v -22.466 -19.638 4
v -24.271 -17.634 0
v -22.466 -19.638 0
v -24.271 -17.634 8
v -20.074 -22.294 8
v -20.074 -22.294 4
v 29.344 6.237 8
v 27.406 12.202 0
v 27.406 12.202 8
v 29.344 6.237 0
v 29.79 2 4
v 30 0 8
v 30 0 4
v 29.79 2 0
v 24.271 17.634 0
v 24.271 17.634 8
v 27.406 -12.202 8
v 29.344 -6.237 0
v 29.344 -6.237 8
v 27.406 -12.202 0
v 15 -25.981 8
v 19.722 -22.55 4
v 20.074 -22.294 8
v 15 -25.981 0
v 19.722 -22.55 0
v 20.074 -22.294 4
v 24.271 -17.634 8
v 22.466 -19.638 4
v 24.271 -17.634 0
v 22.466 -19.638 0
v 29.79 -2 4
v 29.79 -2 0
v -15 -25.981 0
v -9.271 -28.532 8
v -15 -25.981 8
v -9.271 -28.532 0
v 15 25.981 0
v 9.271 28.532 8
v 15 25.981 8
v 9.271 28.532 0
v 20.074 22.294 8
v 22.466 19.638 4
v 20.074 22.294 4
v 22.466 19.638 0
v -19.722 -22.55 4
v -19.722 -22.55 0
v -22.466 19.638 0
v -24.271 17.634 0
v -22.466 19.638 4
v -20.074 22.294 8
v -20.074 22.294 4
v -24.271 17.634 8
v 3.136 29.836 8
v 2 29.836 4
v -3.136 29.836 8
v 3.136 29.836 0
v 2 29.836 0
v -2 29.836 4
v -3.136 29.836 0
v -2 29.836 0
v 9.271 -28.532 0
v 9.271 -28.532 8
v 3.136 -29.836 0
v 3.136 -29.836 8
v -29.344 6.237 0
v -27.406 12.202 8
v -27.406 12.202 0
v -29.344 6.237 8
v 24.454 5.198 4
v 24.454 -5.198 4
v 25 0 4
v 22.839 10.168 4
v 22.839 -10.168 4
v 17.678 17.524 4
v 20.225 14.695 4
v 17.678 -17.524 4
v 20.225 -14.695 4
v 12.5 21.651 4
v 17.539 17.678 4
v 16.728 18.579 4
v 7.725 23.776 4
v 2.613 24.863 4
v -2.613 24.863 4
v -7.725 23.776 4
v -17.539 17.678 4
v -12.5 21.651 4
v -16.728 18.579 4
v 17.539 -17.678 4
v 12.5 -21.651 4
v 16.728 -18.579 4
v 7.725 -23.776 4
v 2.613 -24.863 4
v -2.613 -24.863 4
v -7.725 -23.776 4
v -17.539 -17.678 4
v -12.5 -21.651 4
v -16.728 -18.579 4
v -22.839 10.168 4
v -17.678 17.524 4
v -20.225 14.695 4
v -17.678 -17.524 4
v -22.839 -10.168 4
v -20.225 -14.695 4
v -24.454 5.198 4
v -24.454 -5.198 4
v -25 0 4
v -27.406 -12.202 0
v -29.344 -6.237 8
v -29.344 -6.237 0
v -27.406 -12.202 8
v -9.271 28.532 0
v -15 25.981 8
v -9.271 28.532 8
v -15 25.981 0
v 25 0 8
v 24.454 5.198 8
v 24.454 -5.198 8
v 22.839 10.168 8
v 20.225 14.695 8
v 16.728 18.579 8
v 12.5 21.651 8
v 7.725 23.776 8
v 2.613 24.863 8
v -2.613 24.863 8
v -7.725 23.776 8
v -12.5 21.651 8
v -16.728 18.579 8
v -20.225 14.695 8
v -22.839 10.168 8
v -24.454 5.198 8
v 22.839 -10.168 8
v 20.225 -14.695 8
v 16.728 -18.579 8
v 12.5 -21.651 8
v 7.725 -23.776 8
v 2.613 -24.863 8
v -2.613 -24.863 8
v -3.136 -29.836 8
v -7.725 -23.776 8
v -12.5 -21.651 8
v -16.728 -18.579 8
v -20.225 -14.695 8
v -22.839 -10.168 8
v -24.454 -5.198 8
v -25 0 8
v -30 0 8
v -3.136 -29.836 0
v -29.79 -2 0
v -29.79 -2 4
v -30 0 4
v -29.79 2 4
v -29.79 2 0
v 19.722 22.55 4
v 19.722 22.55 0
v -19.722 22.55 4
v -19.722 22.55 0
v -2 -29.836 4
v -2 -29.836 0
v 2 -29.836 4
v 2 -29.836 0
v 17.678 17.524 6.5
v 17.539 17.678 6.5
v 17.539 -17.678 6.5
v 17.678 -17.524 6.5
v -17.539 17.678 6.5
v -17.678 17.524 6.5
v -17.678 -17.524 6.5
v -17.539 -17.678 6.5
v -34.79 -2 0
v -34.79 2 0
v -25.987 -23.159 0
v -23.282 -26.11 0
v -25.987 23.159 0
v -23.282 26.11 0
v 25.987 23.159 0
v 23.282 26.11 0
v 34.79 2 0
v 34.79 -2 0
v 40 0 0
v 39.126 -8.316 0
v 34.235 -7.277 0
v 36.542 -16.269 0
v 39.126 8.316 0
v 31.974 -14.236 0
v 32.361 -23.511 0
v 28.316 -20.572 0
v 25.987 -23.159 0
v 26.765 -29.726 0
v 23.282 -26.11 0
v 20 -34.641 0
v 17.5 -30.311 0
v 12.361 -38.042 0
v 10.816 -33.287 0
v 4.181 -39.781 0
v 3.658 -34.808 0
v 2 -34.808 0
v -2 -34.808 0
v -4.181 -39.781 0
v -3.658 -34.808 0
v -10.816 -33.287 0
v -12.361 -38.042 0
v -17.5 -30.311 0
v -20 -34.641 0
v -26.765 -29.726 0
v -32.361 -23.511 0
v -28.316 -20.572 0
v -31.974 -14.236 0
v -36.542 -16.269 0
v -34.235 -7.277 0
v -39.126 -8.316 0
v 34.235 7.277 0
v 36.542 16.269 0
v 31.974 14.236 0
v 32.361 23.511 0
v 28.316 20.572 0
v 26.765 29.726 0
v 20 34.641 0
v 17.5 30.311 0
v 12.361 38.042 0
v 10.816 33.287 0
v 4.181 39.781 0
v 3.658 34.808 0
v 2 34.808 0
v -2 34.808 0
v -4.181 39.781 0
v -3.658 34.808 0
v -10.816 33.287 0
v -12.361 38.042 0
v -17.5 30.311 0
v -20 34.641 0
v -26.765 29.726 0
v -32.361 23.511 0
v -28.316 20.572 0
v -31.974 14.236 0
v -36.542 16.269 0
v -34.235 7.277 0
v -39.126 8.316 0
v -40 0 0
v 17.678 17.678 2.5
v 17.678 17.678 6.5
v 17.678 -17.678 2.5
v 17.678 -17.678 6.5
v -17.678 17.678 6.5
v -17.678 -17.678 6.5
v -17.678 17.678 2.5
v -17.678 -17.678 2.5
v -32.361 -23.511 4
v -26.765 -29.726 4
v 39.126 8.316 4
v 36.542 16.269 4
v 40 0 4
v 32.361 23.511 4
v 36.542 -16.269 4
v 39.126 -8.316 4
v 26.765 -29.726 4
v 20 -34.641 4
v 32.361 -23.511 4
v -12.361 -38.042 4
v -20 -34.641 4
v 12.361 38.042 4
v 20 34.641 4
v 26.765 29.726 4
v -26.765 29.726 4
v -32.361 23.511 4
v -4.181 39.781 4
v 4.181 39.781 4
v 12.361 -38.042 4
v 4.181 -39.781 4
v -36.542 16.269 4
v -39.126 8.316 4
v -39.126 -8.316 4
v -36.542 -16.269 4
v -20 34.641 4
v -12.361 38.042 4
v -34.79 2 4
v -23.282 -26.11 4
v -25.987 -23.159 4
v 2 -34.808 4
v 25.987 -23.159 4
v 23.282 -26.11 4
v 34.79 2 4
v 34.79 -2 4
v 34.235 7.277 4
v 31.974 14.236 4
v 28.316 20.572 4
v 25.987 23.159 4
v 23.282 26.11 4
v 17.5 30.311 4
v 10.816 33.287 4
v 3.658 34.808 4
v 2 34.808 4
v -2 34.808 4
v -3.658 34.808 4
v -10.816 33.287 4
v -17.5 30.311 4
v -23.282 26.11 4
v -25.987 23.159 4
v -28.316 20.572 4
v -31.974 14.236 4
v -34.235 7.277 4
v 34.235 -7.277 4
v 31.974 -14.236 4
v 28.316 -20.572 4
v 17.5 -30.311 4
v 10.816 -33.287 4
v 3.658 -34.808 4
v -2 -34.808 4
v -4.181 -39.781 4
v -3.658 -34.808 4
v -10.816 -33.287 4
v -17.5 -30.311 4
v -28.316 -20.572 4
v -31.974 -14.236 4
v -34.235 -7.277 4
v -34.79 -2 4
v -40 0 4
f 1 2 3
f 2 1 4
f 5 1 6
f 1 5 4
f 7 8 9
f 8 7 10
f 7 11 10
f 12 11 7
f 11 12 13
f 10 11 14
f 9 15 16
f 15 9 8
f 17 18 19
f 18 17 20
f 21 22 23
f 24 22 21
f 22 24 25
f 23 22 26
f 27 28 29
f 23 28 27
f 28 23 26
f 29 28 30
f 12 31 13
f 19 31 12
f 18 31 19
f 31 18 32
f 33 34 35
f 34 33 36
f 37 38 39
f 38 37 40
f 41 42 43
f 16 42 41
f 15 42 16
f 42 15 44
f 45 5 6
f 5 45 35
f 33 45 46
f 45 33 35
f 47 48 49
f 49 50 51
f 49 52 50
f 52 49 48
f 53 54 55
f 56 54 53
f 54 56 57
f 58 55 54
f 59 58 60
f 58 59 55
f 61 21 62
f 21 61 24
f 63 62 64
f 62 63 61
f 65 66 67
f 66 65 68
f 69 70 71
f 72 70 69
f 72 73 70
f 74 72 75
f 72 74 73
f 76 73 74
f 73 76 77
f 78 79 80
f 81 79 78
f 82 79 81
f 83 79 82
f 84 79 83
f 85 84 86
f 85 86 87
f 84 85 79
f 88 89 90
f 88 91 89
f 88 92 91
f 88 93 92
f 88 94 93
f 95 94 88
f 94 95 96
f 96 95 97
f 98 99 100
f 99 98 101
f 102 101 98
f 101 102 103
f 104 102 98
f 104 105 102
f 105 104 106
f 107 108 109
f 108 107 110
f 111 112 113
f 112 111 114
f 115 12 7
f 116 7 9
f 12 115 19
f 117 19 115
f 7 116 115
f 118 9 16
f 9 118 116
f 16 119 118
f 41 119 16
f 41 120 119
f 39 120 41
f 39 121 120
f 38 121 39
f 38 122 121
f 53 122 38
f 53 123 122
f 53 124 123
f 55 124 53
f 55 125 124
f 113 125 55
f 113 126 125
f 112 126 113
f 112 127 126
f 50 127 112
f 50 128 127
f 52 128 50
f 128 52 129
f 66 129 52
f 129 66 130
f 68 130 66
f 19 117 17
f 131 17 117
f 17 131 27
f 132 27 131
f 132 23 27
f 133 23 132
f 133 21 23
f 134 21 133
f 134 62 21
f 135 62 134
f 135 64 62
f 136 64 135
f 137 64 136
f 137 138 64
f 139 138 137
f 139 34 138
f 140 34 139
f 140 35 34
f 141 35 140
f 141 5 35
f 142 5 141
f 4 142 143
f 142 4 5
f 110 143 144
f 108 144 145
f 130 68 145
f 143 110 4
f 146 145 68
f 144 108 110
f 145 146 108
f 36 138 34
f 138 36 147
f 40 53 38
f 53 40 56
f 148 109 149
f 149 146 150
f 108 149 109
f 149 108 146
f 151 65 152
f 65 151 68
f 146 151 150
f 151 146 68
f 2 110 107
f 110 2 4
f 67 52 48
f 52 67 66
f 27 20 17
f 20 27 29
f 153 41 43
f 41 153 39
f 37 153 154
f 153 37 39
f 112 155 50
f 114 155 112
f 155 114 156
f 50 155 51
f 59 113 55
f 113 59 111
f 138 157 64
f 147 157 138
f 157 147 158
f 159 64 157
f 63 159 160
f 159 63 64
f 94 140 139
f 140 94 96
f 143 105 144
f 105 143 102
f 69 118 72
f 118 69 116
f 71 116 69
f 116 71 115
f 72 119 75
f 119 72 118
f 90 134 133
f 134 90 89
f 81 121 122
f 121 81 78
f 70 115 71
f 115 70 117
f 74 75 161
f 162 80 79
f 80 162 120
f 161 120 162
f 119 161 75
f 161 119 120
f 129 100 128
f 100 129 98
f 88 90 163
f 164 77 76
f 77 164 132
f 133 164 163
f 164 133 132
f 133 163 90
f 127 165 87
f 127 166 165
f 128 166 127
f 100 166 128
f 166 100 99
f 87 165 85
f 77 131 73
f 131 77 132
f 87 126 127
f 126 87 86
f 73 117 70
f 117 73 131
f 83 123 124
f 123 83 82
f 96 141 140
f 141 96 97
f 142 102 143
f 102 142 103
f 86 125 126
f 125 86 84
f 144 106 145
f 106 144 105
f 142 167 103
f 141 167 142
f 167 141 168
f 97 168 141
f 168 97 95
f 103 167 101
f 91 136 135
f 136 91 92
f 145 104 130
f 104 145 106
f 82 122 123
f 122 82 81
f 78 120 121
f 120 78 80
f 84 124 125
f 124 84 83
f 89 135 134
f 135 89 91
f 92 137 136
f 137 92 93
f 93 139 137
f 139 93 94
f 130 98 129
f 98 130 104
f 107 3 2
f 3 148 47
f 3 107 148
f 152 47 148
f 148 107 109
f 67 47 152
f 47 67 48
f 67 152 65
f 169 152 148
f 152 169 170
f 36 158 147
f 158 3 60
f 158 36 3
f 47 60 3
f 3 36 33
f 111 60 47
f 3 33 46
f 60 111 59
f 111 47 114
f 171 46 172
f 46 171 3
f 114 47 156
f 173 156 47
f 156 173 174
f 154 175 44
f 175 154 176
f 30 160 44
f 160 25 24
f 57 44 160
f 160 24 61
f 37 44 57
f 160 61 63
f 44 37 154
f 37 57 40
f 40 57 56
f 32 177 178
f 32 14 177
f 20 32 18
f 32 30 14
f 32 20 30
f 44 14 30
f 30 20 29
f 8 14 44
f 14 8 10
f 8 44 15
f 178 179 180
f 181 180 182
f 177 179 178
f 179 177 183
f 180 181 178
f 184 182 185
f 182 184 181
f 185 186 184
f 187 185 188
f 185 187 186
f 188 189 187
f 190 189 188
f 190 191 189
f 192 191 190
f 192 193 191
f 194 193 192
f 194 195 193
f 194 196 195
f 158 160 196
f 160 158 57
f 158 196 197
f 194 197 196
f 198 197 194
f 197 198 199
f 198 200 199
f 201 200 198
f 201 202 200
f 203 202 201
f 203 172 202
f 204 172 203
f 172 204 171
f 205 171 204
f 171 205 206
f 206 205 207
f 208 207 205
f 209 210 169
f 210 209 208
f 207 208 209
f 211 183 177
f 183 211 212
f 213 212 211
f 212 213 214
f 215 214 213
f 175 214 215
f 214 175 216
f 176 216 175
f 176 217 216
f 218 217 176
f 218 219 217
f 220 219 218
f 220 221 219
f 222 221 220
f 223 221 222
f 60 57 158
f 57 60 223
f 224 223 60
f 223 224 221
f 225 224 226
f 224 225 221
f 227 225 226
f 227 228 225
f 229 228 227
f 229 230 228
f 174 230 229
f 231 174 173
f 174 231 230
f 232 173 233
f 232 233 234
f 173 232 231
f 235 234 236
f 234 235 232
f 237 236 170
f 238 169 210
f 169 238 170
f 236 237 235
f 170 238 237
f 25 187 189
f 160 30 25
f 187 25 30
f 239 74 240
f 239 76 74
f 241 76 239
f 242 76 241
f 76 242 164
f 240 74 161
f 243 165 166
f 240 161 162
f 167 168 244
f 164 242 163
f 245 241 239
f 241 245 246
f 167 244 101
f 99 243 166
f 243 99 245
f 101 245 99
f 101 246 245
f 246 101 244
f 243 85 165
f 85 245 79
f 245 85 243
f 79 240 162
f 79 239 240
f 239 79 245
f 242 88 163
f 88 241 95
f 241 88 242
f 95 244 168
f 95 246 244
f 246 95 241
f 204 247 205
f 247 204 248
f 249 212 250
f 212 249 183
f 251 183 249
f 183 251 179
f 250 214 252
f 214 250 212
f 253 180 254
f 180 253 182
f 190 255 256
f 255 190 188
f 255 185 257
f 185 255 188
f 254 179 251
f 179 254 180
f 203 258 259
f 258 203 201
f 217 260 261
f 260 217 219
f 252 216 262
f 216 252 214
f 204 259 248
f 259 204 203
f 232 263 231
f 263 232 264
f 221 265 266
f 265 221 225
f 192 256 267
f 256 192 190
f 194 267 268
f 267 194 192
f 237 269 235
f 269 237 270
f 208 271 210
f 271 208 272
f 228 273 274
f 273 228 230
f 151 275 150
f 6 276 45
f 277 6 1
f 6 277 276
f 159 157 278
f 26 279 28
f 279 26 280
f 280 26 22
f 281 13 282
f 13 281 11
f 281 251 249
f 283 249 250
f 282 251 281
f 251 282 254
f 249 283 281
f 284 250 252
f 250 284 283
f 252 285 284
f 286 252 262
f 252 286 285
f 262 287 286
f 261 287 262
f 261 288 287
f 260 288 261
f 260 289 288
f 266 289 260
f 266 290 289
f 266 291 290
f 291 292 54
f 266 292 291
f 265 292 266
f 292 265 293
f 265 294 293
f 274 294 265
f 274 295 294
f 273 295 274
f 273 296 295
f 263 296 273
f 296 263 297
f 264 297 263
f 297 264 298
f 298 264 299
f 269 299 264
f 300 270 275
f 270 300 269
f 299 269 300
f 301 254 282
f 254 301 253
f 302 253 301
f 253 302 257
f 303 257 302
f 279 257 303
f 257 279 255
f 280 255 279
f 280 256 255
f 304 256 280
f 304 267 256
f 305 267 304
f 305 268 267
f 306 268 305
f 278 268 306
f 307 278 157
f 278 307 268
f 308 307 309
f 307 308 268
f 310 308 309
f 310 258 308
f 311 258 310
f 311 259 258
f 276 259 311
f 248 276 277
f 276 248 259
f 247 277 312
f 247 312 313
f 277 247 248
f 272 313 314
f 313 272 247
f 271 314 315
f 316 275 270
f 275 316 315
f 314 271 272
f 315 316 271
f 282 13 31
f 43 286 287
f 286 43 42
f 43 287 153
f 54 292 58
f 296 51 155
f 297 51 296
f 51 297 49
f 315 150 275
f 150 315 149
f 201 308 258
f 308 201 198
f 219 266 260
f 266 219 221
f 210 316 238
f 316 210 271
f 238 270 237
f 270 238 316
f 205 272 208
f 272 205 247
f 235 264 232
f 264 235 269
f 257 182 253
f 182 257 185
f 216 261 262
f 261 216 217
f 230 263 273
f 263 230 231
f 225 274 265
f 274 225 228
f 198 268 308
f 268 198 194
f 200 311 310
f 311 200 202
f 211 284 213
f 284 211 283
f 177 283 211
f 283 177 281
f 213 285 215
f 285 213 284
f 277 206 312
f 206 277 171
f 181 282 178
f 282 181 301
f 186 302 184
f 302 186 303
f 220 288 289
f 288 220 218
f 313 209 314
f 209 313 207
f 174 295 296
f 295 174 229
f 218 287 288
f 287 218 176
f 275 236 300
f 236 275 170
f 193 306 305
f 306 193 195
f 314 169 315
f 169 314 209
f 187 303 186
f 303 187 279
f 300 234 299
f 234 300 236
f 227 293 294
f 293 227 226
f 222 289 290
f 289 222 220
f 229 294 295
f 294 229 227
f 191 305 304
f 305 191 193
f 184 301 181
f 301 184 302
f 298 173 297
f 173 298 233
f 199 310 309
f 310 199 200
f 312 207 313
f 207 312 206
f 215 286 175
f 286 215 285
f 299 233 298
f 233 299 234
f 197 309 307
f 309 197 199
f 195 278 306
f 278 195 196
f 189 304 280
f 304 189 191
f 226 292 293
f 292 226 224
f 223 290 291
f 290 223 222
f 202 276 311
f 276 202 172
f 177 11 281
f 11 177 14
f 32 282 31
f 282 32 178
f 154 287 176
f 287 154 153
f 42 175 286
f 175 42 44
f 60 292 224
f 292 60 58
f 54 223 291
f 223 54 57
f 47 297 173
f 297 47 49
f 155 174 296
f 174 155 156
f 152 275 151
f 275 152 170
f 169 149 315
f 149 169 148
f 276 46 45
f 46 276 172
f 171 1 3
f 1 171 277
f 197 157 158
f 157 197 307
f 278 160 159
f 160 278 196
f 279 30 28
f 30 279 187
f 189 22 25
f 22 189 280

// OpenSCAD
// file: ../src/util.scad
//Данная функция корректно смещает slc_ear и sqr_ear 
//под нужный радиус окружности.
module radiused(radius,offset) {
    ystate = sqrt(radius*radius - offset*offset);
    translate([0,ystate,0]) children(0);
}

module linear_array(length, total) {
    for(x = [0:length/(total - 1):length])
        translate([x,0,0]) children(0);
}

module mirror_copy(vector) {
    union() {
        mirror(vector) children(0);
        children(0);
    }
}
// file: ../src/symbol.scad
//Данный модуль строит 3д символ компании (image/symbol.png) 
module symbol(x,y,z) {
    symbol_file = "../image/symbol.png";
    symbol_x = 100;
    symbol_y = 100;
    
    scale([1/symbol_x*x,1/symbol_y*y,1/100*z])
    translate([0,0,100])
    surface(file=symbol_file, invert=true,center=true);
}

//Демонстрационный код.
//symbol(40,40,10);
// file: ../src/rim.scad
module rim(externalRadius,internalRadius,height) {
    difference() {
        cylinder(r=externalRadius, h=height);
        cylinder(r=internalRadius, h=height+1);
    }
}

//Демонстрационный код.
//based_rim(30, 25, 8, 3);
// file: ../src/ear.scad
include <util.scad>

//Угловатое квадратное ухо.
//"w" - толщина уха
module sqr_ear(y,x,w,h) {
    translate([-y/2,0,0])
    difference() {
        cube([y,x,h]);
        translate([w,0,0]) cube([y-w*2,x-w,h]);
    }
}

//Ухо со сглаженными углами.
//"y" - должен быть больше чем "x".
//"w" - толщина уха
module slc_ear(y,x,w,h){
    rotate([0,0,90])
    translate([0,-y/2,0])
    linear_extrude(height=h)
    polygon([
    [0,0],
    [x/2,0],
    [x,x/2],
    [x,y-x/2],
    [x/2,y],
    [0,y],
    [0,y - w],
    [x/2 - w * sin(45/2),y - w],
    [x - w * sin(45/2*3),y -x/2 - w * cos(45/2*3)],
    [x - w * sin(45/2*3),x/2 + w * cos(45/2*3)],
    [x/2 - w * sin(45/2),w],
    [0,w],
    ]);       
}

//Ухо в виде ободка.
module rim_ears(er,ir,iir,w,h,n) {
    union() {
        difference() {
            cylinder(r=er, h=h);
            translate([0,0,-0.005])cylinder(r=ir, h=h+0.01*h);
        }
        difference() {
            for(fi = [0 : 360/n : 359]) 
            rotate([0,0,fi])
            translate([0,-w/2,0])cube([ir,w,h]);
            translate([0,0,-0.005])cylinder(r=iir,h=h+0.01*h);
        }
    }
}

//Инверсная болванка для выреза "скрытого уха".
module hide_ear(earSz) {
    translate([-2*earSz,earSz/2,0])
    rotate([90,0,0])
    linear_extrude(height = earSz)
    polygon([
    [0,-0.01*earSz],
    [earSz,-0.01*earSz],
    [2*earSz+0.01*earSz,earSz],
    [2*earSz+0.01*earSz,2*earSz],
    ]);  
}

//Демонстрационный код:
//  Массив sqr_ear.
/*for(fi = [0 : 60 : 359]) 
    rotate([0,0,fi])
    radiused(30,10) sqr_ear(10,6,2,3);*/
//linear_array(100,4) sqr_ear(10,6,2,3);

//  Массив slc_ear.
/*for(fi = [0 : 60 : 359]) 
    rotate([0,0,fi])
    radiused(30,10) slc_ear(10,6,2,3);*/

//  Круговое ухо (rim_ears).
//rim_ears(40,35,30,4,3,8);

//  Под вырезы в модели (hide_ear).
//for(fi = [0 : 360/6 : 359])
//   rotate([0,0,fi])
//   translate([30,0,0])hide_ear(2);
// main file
include<../src/ear.scad>
include<../src/rim.scad>
include<../src/symbol.scad>

extRad=30;                  //Внешний радиус
intRad=25;                  //Внутренний радиус обода
rimHeight = 4;              //Высота обода (отсчитывается от базы).
baseHeight = 4;             //Высота базы.
symbSize = intRad*sqrt(2);  //Размер стороны внутреннего квадрата.
symbLevel = 2.5;            //Уровень квадрата.
symbHeight = 5;             //Высота символа.

union() {
    union() {
        difference(){
            union() {
                translate([0,0,baseHeight])
                    rim(externalRadius=extRad,internalRadius=intRad,height=rimHeight);
                cylinder(r=extRad,h=baseHeight);
            }
        
            translate([-symbSize/2,-symbSize/2,symbLevel])
                cube([symbSize,symbSize,rimHeight]);
        }
        translate([0,0,symbLevel])
            symbol(symbSize,symbSize,symbHeight);
    }

    rim_ears(extRad + 10, extRad + 5, extRad - 0.01, baseHeight, baseHeight, 8);
}
